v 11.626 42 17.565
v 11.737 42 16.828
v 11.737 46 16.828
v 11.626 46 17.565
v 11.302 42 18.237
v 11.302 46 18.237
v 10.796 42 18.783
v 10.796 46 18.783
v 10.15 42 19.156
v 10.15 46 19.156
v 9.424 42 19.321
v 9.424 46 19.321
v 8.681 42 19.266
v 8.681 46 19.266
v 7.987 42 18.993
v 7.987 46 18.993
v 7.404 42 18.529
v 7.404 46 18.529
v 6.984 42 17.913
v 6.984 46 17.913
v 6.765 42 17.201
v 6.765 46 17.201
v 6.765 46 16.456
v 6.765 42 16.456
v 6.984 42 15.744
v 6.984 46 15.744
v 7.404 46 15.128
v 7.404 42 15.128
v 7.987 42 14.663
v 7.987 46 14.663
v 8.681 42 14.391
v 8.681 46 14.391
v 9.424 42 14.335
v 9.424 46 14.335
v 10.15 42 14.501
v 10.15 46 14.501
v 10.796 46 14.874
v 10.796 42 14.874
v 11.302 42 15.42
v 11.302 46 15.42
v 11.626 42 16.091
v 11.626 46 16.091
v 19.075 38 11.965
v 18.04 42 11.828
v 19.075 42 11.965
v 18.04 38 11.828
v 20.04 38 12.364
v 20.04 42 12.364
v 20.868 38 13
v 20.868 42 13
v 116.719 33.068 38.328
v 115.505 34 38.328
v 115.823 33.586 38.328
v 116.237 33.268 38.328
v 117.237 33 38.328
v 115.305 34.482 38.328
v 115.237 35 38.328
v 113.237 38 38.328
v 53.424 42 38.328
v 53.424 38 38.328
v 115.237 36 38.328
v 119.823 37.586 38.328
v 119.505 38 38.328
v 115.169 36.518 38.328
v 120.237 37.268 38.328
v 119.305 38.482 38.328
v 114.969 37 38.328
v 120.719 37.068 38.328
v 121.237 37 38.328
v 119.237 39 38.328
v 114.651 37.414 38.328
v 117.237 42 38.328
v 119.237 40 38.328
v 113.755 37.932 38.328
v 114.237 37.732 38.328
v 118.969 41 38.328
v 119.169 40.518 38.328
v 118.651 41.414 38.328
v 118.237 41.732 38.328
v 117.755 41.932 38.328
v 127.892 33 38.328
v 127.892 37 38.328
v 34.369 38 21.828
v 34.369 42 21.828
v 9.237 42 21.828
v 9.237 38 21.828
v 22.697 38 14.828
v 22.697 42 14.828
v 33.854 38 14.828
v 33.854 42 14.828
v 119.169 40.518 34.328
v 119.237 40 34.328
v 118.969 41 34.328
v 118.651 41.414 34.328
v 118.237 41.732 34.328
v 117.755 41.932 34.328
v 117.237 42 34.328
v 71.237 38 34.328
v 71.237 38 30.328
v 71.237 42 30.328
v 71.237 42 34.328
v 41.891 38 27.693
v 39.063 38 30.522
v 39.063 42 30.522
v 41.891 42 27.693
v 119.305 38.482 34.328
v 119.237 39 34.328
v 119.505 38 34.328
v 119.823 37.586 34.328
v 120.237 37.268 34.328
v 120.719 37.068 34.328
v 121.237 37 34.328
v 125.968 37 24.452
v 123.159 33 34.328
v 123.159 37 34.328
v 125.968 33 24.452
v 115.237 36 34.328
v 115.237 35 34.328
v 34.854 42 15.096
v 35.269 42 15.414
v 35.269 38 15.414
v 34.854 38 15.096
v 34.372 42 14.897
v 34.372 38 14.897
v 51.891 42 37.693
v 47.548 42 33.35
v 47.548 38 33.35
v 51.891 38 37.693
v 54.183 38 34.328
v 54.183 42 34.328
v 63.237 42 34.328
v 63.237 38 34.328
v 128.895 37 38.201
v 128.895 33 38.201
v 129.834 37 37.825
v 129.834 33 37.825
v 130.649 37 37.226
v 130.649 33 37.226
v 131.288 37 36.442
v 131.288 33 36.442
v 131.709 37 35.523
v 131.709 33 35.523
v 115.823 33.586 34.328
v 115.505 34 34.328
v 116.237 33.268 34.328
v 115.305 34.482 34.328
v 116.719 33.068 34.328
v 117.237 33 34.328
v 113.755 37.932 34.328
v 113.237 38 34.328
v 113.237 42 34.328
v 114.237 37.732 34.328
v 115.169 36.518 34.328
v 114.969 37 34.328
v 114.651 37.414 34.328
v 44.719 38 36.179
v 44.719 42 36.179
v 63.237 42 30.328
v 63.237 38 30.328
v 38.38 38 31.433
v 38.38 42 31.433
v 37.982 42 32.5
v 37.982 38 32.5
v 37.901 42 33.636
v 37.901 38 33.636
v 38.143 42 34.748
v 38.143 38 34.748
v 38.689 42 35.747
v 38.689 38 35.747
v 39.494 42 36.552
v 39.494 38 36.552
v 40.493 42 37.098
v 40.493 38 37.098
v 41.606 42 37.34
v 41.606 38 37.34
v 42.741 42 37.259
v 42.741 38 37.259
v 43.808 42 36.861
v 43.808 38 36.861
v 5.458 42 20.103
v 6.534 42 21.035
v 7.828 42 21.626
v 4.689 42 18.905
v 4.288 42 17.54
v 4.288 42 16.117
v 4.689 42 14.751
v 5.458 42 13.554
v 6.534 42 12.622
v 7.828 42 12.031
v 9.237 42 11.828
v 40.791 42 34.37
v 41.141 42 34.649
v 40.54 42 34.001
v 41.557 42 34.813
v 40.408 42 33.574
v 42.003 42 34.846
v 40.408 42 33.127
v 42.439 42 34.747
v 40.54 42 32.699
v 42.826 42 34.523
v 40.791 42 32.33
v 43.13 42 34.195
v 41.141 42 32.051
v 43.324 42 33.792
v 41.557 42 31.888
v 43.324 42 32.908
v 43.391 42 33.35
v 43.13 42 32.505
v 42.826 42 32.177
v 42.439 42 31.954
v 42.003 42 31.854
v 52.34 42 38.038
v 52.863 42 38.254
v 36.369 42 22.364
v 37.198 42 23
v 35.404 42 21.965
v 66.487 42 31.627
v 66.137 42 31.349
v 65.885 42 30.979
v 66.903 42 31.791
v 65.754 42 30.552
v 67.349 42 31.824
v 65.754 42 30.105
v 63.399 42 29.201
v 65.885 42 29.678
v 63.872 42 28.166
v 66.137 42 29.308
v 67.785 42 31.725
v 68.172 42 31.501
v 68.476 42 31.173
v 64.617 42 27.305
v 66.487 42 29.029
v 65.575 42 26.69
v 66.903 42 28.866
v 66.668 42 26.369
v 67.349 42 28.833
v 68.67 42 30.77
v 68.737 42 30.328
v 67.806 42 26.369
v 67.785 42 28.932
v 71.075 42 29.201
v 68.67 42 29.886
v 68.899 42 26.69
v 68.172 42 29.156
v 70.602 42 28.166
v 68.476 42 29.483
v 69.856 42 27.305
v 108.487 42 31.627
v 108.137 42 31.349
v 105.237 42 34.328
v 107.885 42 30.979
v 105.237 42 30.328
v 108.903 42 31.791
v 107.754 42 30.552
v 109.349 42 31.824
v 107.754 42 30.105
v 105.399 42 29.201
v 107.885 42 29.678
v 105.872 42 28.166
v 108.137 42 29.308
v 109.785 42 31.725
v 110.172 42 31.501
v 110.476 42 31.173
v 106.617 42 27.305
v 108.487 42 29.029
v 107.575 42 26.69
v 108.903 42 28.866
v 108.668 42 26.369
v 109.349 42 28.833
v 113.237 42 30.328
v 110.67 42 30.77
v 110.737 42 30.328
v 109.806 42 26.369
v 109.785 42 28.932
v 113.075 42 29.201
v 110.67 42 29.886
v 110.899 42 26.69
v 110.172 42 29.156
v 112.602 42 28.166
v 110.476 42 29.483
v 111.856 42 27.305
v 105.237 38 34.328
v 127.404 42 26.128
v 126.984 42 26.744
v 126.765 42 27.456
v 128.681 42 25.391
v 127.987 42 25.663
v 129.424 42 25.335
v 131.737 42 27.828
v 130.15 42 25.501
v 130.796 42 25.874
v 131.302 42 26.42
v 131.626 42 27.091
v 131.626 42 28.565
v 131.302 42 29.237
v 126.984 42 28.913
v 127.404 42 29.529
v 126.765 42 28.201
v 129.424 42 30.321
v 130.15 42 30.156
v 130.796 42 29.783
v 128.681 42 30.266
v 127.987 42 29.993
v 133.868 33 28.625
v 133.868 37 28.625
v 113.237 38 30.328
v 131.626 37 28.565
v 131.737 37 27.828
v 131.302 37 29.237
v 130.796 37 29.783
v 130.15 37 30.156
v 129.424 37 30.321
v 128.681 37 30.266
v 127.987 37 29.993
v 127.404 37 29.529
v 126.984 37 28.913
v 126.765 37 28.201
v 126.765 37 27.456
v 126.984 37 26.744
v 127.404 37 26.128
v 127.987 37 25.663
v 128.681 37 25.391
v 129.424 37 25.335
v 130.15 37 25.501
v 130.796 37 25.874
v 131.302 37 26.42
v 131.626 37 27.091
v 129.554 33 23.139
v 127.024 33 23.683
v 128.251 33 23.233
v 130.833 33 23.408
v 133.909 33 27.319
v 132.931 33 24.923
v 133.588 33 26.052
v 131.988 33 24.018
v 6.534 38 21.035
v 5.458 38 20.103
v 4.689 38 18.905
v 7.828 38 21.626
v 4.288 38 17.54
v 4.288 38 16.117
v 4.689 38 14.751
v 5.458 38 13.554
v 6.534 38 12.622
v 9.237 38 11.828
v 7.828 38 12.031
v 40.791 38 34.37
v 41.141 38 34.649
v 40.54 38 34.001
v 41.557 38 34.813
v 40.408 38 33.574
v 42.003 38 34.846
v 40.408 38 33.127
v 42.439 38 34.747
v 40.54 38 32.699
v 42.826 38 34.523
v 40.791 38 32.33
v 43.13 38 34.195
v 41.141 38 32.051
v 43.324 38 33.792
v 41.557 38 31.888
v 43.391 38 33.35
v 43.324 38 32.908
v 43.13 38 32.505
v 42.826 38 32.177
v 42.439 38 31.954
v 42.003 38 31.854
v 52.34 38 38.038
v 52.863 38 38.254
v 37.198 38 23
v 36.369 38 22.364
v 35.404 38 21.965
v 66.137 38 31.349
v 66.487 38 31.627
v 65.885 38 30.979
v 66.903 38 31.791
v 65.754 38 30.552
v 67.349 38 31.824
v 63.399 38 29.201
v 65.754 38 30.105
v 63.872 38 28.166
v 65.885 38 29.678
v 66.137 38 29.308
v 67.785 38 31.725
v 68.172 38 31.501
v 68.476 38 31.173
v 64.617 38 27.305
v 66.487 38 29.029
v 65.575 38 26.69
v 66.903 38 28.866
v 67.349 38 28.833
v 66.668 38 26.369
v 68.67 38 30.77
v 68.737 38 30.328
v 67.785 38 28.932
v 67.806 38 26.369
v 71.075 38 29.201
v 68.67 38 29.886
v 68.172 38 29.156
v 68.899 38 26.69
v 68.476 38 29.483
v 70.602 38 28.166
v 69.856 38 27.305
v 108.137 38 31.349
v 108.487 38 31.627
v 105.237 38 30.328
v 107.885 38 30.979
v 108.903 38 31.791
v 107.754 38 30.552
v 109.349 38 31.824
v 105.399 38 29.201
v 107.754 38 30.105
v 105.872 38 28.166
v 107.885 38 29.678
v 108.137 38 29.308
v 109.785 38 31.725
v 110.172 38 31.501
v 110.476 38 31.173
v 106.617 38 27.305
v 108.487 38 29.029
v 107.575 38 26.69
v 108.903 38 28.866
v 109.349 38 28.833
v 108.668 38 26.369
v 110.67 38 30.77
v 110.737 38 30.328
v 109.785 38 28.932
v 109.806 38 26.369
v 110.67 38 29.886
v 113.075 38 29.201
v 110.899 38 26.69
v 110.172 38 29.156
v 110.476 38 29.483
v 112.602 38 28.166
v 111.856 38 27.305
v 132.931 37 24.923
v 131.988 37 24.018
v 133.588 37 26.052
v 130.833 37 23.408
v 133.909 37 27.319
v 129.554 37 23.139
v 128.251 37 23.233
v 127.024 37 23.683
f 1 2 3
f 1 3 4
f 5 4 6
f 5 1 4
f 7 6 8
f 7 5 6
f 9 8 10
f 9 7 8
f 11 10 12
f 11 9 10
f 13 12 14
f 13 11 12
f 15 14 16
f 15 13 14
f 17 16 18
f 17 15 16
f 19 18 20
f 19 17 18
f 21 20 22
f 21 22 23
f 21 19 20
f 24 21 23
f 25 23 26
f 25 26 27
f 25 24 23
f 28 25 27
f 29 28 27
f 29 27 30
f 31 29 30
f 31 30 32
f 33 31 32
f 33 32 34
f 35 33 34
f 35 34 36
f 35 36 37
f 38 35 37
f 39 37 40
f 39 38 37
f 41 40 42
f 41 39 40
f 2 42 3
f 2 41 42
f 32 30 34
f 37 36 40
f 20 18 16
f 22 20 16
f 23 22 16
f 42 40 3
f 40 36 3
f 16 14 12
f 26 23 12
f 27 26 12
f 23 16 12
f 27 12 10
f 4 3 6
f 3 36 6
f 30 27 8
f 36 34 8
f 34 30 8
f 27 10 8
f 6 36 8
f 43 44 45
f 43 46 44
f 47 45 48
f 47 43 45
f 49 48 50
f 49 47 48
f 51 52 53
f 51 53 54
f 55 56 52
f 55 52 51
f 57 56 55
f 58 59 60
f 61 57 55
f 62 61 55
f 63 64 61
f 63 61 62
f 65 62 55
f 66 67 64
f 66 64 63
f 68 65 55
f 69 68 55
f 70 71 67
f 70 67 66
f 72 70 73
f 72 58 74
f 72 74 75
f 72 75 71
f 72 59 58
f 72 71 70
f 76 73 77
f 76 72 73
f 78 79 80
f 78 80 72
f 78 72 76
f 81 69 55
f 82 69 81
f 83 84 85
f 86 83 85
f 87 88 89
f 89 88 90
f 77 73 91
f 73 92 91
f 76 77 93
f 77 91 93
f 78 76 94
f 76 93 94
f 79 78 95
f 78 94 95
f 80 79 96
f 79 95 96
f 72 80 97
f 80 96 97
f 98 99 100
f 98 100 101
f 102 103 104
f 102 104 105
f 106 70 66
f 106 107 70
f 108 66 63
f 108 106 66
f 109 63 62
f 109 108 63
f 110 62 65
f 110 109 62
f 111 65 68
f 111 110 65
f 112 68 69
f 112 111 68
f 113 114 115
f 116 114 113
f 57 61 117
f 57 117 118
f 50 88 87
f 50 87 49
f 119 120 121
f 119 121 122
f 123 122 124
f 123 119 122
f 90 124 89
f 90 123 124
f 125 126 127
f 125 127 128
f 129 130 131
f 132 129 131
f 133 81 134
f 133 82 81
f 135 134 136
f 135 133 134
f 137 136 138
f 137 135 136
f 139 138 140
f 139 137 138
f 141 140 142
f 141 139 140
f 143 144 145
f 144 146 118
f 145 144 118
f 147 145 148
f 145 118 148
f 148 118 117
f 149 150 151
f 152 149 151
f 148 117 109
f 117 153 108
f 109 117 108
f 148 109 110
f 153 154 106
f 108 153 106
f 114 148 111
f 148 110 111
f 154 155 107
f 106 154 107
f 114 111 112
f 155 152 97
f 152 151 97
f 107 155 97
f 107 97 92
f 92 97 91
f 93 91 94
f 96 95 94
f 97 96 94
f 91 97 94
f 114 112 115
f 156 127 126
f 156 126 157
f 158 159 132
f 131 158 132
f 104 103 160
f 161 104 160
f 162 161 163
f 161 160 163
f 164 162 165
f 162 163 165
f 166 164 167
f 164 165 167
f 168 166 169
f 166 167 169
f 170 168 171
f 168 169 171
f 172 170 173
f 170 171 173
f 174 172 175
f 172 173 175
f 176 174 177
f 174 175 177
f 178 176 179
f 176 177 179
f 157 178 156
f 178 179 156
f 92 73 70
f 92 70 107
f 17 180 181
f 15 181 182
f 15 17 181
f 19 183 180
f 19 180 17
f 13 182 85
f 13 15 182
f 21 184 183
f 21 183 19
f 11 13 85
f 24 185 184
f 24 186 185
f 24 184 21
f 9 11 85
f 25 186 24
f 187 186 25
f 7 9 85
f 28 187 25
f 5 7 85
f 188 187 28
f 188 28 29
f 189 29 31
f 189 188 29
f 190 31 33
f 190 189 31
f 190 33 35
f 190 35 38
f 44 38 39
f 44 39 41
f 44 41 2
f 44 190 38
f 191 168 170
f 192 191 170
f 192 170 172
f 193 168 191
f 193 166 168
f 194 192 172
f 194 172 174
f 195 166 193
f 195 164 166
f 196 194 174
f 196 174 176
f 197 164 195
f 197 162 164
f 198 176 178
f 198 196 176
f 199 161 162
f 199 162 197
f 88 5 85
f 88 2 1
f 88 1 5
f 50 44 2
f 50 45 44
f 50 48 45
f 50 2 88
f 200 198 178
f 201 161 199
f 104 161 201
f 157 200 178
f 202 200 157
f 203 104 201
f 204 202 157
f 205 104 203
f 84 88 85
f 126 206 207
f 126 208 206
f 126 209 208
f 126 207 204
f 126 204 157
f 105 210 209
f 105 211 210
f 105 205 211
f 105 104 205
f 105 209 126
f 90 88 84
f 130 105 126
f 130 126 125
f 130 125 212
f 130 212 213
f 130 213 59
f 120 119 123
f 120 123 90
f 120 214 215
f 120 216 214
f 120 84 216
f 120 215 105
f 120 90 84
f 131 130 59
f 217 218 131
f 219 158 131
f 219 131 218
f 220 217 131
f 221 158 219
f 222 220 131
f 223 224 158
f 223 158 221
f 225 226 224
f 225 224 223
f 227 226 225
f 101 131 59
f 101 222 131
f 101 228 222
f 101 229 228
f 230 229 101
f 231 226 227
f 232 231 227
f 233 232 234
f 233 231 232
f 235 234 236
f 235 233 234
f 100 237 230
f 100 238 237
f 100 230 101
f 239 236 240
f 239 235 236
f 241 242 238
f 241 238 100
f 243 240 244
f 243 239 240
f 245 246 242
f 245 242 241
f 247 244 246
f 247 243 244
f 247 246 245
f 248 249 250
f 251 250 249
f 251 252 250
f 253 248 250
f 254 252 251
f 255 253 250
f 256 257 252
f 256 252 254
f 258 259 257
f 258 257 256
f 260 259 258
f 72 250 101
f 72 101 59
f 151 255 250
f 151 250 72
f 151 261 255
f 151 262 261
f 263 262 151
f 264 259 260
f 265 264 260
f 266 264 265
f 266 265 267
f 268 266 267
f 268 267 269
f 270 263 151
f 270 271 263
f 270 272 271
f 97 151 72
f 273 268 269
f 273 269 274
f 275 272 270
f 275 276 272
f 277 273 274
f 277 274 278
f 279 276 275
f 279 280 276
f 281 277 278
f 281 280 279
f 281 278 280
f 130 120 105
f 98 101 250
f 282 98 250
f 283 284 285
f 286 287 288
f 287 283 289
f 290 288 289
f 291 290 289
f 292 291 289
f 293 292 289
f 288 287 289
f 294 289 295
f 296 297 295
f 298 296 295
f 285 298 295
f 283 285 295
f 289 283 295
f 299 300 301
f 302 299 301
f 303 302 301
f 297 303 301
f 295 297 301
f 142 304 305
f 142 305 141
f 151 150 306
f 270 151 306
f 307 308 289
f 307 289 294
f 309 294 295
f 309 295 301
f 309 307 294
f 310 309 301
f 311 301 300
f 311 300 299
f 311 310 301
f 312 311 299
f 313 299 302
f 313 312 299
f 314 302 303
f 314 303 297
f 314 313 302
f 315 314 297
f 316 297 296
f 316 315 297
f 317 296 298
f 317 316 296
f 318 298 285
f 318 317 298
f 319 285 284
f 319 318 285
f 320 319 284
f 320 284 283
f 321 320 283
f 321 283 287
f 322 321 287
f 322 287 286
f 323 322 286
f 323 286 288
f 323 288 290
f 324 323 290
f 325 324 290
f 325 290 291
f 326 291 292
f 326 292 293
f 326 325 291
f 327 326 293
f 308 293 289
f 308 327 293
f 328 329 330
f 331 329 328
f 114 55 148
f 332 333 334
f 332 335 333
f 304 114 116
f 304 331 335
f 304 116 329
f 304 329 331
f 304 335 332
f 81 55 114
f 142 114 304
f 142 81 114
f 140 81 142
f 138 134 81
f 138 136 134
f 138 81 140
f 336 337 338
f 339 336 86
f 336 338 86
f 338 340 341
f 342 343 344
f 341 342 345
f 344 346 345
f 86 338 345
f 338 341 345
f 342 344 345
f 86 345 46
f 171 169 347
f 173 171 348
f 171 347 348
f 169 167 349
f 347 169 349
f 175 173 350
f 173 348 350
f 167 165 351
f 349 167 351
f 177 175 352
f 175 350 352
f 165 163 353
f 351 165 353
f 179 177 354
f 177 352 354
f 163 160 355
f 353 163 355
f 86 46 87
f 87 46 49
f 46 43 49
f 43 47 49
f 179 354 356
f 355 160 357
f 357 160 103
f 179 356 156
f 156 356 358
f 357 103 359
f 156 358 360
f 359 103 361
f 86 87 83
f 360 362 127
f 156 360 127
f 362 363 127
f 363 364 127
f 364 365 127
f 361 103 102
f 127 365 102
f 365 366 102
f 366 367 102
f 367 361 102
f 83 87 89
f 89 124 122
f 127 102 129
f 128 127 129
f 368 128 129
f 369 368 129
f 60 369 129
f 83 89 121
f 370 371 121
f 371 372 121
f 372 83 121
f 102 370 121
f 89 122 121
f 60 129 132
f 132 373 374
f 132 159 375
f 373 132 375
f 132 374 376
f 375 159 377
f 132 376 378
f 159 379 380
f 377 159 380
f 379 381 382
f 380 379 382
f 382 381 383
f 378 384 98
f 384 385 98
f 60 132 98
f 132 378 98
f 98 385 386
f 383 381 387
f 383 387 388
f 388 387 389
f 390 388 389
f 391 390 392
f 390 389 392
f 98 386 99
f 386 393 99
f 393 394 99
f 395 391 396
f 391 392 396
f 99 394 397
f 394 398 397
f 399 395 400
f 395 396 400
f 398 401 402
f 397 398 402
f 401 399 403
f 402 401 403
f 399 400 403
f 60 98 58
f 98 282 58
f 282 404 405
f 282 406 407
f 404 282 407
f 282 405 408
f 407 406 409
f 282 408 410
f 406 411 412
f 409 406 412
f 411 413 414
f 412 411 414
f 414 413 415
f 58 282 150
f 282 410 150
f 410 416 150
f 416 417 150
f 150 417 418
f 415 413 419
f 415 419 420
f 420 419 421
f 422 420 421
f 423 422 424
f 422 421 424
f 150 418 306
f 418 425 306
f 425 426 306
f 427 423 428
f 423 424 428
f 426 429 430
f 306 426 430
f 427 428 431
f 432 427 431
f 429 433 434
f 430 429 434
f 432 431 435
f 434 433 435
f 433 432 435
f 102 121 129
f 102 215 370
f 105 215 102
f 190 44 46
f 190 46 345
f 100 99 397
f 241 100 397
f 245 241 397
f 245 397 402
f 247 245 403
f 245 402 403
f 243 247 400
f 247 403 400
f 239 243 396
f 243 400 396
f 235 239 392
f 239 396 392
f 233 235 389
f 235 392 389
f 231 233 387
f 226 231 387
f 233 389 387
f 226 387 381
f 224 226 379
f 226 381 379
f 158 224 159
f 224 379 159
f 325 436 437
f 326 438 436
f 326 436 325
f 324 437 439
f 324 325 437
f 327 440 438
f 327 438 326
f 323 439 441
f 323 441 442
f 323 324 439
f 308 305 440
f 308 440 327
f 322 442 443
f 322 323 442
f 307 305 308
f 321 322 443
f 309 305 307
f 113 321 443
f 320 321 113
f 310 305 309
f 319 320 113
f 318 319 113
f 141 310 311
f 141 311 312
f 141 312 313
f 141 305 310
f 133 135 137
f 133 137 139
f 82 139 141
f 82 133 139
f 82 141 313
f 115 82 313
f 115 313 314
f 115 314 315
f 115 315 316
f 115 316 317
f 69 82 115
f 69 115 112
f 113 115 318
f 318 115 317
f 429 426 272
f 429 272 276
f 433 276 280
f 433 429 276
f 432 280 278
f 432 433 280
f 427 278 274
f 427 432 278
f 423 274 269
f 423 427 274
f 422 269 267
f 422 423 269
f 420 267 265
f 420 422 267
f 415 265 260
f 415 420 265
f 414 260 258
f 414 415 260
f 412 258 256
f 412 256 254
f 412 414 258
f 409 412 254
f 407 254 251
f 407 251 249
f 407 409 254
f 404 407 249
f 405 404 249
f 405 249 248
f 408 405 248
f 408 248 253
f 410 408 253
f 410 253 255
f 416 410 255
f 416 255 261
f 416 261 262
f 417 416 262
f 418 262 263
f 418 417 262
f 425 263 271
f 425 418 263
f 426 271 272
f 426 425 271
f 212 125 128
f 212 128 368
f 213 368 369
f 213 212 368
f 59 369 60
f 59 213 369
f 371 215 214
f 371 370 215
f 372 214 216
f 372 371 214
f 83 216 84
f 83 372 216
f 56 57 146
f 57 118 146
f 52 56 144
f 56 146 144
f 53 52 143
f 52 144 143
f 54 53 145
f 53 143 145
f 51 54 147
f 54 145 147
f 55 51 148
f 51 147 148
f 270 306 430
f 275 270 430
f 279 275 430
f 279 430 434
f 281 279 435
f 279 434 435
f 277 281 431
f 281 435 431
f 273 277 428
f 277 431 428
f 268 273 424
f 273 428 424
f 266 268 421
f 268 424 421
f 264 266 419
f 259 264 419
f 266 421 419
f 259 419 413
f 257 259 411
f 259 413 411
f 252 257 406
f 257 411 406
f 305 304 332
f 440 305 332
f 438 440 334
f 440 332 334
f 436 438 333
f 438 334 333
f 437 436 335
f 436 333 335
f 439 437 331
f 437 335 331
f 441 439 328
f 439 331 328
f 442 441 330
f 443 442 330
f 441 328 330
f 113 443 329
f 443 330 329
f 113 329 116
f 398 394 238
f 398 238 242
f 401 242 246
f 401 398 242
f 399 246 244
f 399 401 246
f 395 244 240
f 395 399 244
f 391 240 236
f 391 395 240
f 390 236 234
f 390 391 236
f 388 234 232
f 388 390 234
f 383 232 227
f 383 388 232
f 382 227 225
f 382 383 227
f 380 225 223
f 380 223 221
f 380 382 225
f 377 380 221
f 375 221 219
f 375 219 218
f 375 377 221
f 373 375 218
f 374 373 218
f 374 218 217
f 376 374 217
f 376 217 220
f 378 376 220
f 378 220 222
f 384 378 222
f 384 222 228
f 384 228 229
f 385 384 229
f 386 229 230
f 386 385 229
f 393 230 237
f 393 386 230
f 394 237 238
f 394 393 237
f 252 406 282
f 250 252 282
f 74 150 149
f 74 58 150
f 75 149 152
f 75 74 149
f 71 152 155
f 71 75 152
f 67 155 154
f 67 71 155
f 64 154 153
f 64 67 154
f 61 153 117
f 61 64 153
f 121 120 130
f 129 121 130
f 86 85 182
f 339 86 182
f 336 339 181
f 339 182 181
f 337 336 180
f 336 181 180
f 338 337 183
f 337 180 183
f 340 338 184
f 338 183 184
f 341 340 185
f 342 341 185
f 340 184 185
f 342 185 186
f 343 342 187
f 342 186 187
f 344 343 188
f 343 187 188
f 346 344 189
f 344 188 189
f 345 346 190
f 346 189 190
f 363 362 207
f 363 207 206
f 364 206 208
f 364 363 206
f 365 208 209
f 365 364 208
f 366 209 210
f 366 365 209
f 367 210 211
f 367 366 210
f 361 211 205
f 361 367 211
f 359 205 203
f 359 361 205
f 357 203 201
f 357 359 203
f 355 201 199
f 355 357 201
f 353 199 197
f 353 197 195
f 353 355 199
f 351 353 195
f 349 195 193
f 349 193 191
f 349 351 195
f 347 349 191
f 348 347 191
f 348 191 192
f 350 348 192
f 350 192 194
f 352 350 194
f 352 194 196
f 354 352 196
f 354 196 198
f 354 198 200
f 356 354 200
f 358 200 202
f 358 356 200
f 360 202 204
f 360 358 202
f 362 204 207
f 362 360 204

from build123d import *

# Parameters (mm, degrees)
PAD018_DEPTH = 4
PAD019_DEPTH = 4
SKETCH035_R  = 2.5
PAD020_DEPTH = 4
PAD021_DEPTH = 4
PAD022_DEPTH = 4
SKETCH038_R  = 2.5
PAD023_DEPTH = 5
FILLET_R     = 2
FILLET001_R  = 2
FILLET002_R  = 4
FILLET003_R  = 4
SKETCH049_R  = 1.5
PAD028_DEPTH = 4


with BuildPart() as dragshaftr:
    # Sketch033 → Pad018 (new body)
    with BuildSketch(Plane.XZ):
        with BuildLine():
            Line((44.945992765, 17.5), (110, 17.5))
            Line((110, 21.5), (110, 17.5))
            Line((44.1871982538, 21.5), (110, 21.5))
            ThreePointArc((42.6541143847, 20.8649758691), (43.3574992426, 21.3349626055), (44.1871982538, 21.5))
            Line((23.7891385155, 2), (42.6541143847, 20.8649758691))
            Line((0, 2), (23.7891385155, 2))
            ThreePointArc((0, -2), (-2, 0), (0, 2))
            Line((0, -2), (24.6175656403, -2))
            ThreePointArc((26.0317792027, -1.4142135624), (25.382932505, -1.847759065), (24.6175656403, -2))
            Line((26.0317792027, -1.4142135624), (44.945992765, 17.5))
        make_face()
    extrude(amount=-PAD018_DEPTH)

    # Sketch034 (on Face11 of Pad018) → Pad019 (join)
    with BuildSketch(Plane.XZ):
        with BuildLine():
            ThreePointArc((-5.64e-08, 5), (-5, -1.69e-08), (-2.26e-08, -5))
            Line((10.4599999543, -5), (-2.26e-08, -5))
            Line((14.8031457045, -0.6568542495), (10.4599999543, -5))
            Line((26.7891385155, -0.6568542495), (14.8031457045, -0.6568542495))
            Line((26.7891385155, 5), (26.7891385155, -0.6568542495))
            Line((26.7891385155, 5), (-5.64e-08, 5))
        make_face()
    extrude(amount=-PAD019_DEPTH)

    # Sketch035 (on Face13 of Pad019) → Pad020 (join)
    with BuildSketch(Plane.XZ):
        Circle(SKETCH035_R)
    extrude(amount=PAD020_DEPTH)

    # Sketch036 (on Face7 of Pad020) → Pad021 (join)
    with BuildSketch(Plane(origin=(0, 0, 21.5), x_dir=(-1, 0, 0), z_dir=(0, 0, 1))):
        Polygon((-110, 0), (-106, 0), (-106, -9), (-121.594421, -9), (-121.594421, -5), (-110, -5), align=None)
    extrude(amount=-PAD021_DEPTH)

    # Sketch037 (on Face12 of Pad021) → Pad022 (join)
    with BuildSketch(Plane(origin=(0, 9, 0), x_dir=(1, 0, 0), z_dir=(0, 1, 0))):
        with BuildLine():
            Line((121.594421, -21.5), (112.78511, -21.5))
            Line((112.78511, -21.5), (116.730789, -7.623817))
            ThreePointArc((124.6315830417, -11.7967375602), (122.1948418839, -6.844398802), (116.730789, -7.623817))
            Line((124.6315830417, -11.7967375602), (121.594421, -21.5))
        make_face()
    extrude(amount=-PAD022_DEPTH)

    # Sketch038 (on Face21 of Pad022) → Pad023 (join)
    with BuildSketch(Plane.XZ.offset(-5)):
        with Locations((120, 11)):
            Circle(SKETCH038_R)
    extrude(amount=PAD023_DEPTH)

    # Fillet
    fillet_edges = [dragshaftr.edges().sort_by_distance(p)[0] for p in [
        (110, 0, 19.5),
        (106, 9, 19.5),
    ]]
    fillet(fillet_edges, radius=FILLET_R)

    # Fillet001
    fillet001_edges = [dragshaftr.edges().sort_by_distance(p)[0] for p in [
        (106, 4, 19.5),
        (110, 5, 19.5),
    ]]
    fillet(fillet001_edges, radius=FILLET001_R)

    # Fillet002
    fillet002_edges = [dragshaftr.edges().sort_by_distance(p)[0] for p in [
        (121.594421, 7, 21.5),
    ]]
    fillet(fillet002_edges, radius=FILLET002_R)

    # Fillet003
    fillet003_edges = [dragshaftr.edges().sort_by_distance(p)[0] for p in [
        (26.789139, 2, 5),
        (10.46, 2, -5),
    ]]
    fillet(fillet003_edges, radius=FILLET003_R)

    # Sketch049 (on Face17 of Fillet003) → Pad028 (join)
    with BuildSketch(Plane(origin=(0, 4, 0), x_dir=(1, 0, 0), z_dir=(0, 1, 0))):
        with BuildLine():
            ThreePointArc((62, -13.5000013856), (58.0000006928, -9.5), (54, -13.5))
            Line((54, -13.5), (54, -17.5))
            Line((61.9999986144, -17.5), (54, -17.5))
            Line((62, -13.5000013856), (61.9999986144, -17.5))
        make_face()
        with Locations((58, -13.5)):
            Circle(SKETCH049_R, mode=Mode.SUBTRACT)
        with BuildLine():
            ThreePointArc((104, -13.5000013856), (100.0000006928, -9.5), (96, -13.5))
            Line((96, -13.5), (96, -17.5))
            Line((96, -17.5), (104, -17.5))
            Line((104, -17.5), (104, -13.5000013856))
        make_face()
        with Locations((100, -13.5)):
            Circle(SKETCH049_R, mode=Mode.SUBTRACT)
        with BuildLine():
            ThreePointArc((29.8256872599, -13.6934049535), (29.8256877498, -19.3502596929), (35.4825424892, -19.3502582232))
            Line((38.310969614, -16.5218310984), (35.4825424892, -19.3502582232))
            Line((32.6541153645, -10.8649768489), (38.310969614, -16.5218310984))
            Line((29.8256872599, -13.6934049535), (32.6541153645, -10.8649768489))
        make_face()
        with Locations((32.6541143847, -16.5218320782)):
            Circle(SKETCH049_R, mode=Mode.SUBTRACT)
    extrude(amount=-PAD028_DEPTH)


with BuildPart() as dragshaftr_1:
    # Body004 placement: moved
    add(dragshaftr.part.moved(Location((0, 8, 13))))


with BuildPart() as part_mirroring:
    # Part__Mirroring: instance of DragShaftR
    add(dragshaftr_1.part.mirror(Plane(origin=(0, 0, 0), x_dir=(1, 0, 0), z_dir=(0, 1, 0))))


with BuildPart() as part_mirroring_1:
    # Part__Mirroring placement: moved
    add(part_mirroring.part.moved(Location((9.2368815712, 50, 3.828366479))))


solid = part_mirroring_1.part
